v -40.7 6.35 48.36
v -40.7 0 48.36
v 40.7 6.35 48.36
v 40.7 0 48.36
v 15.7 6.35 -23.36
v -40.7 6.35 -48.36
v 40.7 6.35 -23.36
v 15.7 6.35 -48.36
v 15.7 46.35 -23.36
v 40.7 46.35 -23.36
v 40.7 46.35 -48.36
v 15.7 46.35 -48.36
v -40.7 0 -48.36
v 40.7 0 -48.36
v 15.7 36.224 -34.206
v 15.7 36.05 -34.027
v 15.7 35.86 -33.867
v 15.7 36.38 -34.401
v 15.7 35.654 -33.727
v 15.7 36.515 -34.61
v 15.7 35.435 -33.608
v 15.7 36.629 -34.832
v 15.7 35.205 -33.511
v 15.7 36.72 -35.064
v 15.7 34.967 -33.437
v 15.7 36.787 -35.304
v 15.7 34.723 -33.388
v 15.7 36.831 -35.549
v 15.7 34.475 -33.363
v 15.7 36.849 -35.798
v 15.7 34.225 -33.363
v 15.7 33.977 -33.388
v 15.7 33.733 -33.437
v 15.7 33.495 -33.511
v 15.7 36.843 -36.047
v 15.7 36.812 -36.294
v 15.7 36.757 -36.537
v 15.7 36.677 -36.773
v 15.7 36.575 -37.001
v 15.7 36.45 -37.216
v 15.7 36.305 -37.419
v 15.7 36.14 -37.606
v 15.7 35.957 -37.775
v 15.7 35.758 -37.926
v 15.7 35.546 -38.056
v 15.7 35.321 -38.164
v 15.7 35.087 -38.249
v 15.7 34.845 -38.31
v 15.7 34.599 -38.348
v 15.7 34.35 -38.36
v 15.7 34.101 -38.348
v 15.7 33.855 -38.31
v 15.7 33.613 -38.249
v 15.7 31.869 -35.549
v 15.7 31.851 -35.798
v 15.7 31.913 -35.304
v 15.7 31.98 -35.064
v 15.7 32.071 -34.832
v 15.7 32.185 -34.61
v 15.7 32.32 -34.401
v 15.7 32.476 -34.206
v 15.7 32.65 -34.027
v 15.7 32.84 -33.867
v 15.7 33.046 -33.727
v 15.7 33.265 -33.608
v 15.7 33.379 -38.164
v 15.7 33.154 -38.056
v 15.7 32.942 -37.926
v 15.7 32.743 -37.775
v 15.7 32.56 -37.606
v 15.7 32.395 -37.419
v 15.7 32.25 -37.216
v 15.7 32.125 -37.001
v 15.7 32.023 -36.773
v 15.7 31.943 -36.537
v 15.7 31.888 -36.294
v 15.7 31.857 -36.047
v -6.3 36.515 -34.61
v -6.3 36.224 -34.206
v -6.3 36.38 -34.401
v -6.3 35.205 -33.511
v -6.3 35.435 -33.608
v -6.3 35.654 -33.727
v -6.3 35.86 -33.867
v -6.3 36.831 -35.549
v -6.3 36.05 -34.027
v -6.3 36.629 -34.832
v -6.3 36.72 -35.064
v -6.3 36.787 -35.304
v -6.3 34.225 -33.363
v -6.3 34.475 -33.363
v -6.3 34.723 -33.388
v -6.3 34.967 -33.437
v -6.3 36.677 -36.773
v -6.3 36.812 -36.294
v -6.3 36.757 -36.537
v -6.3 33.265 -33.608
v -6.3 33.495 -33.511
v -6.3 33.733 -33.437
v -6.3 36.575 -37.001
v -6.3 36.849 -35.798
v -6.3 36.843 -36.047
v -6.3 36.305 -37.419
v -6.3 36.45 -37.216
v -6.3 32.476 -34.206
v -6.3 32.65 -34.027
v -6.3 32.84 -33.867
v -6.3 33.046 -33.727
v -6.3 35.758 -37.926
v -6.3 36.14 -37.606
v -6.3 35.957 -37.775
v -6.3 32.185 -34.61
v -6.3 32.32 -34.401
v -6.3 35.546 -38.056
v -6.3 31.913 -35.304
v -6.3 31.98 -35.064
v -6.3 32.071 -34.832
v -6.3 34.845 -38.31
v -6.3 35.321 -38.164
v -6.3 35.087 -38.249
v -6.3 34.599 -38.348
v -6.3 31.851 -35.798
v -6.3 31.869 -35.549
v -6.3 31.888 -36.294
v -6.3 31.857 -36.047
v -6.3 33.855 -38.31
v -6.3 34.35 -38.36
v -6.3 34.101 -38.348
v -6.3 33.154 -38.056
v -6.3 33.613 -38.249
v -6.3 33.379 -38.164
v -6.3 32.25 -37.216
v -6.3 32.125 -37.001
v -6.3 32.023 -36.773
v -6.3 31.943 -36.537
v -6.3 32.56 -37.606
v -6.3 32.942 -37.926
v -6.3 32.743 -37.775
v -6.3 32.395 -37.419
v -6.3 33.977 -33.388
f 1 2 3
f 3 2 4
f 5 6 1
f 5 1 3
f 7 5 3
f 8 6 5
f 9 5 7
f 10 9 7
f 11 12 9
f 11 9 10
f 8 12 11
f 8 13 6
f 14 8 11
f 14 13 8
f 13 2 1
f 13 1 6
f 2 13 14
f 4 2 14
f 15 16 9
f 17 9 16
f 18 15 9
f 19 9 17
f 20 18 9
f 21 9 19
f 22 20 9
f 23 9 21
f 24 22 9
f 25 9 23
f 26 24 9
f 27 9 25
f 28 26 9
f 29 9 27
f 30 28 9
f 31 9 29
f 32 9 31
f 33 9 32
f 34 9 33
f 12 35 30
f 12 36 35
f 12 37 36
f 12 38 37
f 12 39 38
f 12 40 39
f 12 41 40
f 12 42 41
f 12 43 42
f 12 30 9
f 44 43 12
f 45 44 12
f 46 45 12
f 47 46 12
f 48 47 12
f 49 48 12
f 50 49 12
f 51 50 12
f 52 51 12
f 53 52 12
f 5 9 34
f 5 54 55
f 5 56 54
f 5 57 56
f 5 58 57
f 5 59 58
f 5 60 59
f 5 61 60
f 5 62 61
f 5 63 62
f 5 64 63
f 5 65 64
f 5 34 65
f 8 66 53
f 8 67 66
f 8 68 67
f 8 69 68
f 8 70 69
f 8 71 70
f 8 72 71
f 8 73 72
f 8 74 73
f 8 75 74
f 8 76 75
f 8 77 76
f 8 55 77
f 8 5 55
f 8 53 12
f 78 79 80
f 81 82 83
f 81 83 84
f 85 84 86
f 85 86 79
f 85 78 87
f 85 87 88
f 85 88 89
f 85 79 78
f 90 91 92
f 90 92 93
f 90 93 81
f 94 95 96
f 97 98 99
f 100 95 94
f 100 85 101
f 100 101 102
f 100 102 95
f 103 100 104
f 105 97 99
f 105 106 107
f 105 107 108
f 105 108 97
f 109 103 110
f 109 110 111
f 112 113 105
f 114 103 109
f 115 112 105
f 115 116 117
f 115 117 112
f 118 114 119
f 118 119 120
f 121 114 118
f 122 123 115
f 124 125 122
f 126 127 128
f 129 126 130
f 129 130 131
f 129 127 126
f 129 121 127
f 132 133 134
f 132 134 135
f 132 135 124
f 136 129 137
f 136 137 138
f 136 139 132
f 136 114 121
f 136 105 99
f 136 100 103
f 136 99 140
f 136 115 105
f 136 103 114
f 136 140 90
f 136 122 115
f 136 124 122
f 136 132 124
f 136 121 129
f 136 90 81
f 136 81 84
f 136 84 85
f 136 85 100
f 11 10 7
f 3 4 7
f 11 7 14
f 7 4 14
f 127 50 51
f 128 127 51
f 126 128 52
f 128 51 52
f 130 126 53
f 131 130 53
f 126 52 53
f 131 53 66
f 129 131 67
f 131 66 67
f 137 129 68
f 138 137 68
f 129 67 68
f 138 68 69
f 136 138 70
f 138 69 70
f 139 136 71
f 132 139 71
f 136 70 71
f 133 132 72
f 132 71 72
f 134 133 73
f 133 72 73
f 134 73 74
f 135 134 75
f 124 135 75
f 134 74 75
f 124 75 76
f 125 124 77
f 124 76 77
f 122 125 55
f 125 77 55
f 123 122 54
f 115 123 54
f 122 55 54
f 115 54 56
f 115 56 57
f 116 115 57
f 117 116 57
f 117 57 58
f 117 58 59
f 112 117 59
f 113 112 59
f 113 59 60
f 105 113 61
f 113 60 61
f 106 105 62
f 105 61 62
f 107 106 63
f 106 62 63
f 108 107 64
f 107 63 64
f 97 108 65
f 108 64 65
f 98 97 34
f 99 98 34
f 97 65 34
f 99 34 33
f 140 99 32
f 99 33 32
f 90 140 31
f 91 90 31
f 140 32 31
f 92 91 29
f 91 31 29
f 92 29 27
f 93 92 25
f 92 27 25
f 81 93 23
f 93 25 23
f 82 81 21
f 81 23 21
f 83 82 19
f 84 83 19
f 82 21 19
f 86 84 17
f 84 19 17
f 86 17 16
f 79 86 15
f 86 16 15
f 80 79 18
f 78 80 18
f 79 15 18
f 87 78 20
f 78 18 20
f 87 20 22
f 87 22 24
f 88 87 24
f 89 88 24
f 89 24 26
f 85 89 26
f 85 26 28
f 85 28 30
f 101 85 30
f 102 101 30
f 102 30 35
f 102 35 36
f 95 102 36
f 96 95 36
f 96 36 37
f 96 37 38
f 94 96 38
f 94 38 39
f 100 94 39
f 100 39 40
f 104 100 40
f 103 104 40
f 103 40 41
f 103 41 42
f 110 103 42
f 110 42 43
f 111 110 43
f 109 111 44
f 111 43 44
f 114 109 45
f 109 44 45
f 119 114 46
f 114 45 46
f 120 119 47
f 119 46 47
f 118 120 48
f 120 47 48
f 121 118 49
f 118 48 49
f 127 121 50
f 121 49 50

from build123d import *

# Parameters (mm, degrees)
SKETCH1_W           = 81.4
SKETCH1_H           = 96.72
BOSS_EXTRUDE1_DEPTH = 6.35
SKETCH2_W           = 25
SKETCH2_H           = 25
BOSS_EXTRUDE2_DEPTH = 40
SKETCH3_R           = 2.5
BOSS_EXTRUDE3_DEPTH = 22


with BuildPart() as part:
    # Sketch1 → Boss-Extrude1 (new body)
    with BuildSketch(Plane(origin=(0, 0, 0), x_dir=(1, 0, 0), z_dir=(0, 1, 0))):
        Rectangle(SKETCH1_W, SKETCH1_H)
    extrude(amount=BOSS_EXTRUDE1_DEPTH)

    # Sketch2 → Boss-Extrude2 (add)
    with BuildSketch(Plane(origin=(0, 6.35, 0), x_dir=(1, 0, 0), z_dir=(0, 1, 0))):
        with Locations((28.2, 35.86)):
            Rectangle(SKETCH2_W, SKETCH2_H)
    extrude(amount=BOSS_EXTRUDE2_DEPTH)

    # Sketch3 → Boss-Extrude3 (add)
    with BuildSketch(Plane.ZY.offset(-15.7)):
        with Locations(Location((-35.86, 34.35, 0), (0, 0, 180))):
            Circle(SKETCH3_R)
    extrude(amount=BOSS_EXTRUDE3_DEPTH)


solid = part.part
